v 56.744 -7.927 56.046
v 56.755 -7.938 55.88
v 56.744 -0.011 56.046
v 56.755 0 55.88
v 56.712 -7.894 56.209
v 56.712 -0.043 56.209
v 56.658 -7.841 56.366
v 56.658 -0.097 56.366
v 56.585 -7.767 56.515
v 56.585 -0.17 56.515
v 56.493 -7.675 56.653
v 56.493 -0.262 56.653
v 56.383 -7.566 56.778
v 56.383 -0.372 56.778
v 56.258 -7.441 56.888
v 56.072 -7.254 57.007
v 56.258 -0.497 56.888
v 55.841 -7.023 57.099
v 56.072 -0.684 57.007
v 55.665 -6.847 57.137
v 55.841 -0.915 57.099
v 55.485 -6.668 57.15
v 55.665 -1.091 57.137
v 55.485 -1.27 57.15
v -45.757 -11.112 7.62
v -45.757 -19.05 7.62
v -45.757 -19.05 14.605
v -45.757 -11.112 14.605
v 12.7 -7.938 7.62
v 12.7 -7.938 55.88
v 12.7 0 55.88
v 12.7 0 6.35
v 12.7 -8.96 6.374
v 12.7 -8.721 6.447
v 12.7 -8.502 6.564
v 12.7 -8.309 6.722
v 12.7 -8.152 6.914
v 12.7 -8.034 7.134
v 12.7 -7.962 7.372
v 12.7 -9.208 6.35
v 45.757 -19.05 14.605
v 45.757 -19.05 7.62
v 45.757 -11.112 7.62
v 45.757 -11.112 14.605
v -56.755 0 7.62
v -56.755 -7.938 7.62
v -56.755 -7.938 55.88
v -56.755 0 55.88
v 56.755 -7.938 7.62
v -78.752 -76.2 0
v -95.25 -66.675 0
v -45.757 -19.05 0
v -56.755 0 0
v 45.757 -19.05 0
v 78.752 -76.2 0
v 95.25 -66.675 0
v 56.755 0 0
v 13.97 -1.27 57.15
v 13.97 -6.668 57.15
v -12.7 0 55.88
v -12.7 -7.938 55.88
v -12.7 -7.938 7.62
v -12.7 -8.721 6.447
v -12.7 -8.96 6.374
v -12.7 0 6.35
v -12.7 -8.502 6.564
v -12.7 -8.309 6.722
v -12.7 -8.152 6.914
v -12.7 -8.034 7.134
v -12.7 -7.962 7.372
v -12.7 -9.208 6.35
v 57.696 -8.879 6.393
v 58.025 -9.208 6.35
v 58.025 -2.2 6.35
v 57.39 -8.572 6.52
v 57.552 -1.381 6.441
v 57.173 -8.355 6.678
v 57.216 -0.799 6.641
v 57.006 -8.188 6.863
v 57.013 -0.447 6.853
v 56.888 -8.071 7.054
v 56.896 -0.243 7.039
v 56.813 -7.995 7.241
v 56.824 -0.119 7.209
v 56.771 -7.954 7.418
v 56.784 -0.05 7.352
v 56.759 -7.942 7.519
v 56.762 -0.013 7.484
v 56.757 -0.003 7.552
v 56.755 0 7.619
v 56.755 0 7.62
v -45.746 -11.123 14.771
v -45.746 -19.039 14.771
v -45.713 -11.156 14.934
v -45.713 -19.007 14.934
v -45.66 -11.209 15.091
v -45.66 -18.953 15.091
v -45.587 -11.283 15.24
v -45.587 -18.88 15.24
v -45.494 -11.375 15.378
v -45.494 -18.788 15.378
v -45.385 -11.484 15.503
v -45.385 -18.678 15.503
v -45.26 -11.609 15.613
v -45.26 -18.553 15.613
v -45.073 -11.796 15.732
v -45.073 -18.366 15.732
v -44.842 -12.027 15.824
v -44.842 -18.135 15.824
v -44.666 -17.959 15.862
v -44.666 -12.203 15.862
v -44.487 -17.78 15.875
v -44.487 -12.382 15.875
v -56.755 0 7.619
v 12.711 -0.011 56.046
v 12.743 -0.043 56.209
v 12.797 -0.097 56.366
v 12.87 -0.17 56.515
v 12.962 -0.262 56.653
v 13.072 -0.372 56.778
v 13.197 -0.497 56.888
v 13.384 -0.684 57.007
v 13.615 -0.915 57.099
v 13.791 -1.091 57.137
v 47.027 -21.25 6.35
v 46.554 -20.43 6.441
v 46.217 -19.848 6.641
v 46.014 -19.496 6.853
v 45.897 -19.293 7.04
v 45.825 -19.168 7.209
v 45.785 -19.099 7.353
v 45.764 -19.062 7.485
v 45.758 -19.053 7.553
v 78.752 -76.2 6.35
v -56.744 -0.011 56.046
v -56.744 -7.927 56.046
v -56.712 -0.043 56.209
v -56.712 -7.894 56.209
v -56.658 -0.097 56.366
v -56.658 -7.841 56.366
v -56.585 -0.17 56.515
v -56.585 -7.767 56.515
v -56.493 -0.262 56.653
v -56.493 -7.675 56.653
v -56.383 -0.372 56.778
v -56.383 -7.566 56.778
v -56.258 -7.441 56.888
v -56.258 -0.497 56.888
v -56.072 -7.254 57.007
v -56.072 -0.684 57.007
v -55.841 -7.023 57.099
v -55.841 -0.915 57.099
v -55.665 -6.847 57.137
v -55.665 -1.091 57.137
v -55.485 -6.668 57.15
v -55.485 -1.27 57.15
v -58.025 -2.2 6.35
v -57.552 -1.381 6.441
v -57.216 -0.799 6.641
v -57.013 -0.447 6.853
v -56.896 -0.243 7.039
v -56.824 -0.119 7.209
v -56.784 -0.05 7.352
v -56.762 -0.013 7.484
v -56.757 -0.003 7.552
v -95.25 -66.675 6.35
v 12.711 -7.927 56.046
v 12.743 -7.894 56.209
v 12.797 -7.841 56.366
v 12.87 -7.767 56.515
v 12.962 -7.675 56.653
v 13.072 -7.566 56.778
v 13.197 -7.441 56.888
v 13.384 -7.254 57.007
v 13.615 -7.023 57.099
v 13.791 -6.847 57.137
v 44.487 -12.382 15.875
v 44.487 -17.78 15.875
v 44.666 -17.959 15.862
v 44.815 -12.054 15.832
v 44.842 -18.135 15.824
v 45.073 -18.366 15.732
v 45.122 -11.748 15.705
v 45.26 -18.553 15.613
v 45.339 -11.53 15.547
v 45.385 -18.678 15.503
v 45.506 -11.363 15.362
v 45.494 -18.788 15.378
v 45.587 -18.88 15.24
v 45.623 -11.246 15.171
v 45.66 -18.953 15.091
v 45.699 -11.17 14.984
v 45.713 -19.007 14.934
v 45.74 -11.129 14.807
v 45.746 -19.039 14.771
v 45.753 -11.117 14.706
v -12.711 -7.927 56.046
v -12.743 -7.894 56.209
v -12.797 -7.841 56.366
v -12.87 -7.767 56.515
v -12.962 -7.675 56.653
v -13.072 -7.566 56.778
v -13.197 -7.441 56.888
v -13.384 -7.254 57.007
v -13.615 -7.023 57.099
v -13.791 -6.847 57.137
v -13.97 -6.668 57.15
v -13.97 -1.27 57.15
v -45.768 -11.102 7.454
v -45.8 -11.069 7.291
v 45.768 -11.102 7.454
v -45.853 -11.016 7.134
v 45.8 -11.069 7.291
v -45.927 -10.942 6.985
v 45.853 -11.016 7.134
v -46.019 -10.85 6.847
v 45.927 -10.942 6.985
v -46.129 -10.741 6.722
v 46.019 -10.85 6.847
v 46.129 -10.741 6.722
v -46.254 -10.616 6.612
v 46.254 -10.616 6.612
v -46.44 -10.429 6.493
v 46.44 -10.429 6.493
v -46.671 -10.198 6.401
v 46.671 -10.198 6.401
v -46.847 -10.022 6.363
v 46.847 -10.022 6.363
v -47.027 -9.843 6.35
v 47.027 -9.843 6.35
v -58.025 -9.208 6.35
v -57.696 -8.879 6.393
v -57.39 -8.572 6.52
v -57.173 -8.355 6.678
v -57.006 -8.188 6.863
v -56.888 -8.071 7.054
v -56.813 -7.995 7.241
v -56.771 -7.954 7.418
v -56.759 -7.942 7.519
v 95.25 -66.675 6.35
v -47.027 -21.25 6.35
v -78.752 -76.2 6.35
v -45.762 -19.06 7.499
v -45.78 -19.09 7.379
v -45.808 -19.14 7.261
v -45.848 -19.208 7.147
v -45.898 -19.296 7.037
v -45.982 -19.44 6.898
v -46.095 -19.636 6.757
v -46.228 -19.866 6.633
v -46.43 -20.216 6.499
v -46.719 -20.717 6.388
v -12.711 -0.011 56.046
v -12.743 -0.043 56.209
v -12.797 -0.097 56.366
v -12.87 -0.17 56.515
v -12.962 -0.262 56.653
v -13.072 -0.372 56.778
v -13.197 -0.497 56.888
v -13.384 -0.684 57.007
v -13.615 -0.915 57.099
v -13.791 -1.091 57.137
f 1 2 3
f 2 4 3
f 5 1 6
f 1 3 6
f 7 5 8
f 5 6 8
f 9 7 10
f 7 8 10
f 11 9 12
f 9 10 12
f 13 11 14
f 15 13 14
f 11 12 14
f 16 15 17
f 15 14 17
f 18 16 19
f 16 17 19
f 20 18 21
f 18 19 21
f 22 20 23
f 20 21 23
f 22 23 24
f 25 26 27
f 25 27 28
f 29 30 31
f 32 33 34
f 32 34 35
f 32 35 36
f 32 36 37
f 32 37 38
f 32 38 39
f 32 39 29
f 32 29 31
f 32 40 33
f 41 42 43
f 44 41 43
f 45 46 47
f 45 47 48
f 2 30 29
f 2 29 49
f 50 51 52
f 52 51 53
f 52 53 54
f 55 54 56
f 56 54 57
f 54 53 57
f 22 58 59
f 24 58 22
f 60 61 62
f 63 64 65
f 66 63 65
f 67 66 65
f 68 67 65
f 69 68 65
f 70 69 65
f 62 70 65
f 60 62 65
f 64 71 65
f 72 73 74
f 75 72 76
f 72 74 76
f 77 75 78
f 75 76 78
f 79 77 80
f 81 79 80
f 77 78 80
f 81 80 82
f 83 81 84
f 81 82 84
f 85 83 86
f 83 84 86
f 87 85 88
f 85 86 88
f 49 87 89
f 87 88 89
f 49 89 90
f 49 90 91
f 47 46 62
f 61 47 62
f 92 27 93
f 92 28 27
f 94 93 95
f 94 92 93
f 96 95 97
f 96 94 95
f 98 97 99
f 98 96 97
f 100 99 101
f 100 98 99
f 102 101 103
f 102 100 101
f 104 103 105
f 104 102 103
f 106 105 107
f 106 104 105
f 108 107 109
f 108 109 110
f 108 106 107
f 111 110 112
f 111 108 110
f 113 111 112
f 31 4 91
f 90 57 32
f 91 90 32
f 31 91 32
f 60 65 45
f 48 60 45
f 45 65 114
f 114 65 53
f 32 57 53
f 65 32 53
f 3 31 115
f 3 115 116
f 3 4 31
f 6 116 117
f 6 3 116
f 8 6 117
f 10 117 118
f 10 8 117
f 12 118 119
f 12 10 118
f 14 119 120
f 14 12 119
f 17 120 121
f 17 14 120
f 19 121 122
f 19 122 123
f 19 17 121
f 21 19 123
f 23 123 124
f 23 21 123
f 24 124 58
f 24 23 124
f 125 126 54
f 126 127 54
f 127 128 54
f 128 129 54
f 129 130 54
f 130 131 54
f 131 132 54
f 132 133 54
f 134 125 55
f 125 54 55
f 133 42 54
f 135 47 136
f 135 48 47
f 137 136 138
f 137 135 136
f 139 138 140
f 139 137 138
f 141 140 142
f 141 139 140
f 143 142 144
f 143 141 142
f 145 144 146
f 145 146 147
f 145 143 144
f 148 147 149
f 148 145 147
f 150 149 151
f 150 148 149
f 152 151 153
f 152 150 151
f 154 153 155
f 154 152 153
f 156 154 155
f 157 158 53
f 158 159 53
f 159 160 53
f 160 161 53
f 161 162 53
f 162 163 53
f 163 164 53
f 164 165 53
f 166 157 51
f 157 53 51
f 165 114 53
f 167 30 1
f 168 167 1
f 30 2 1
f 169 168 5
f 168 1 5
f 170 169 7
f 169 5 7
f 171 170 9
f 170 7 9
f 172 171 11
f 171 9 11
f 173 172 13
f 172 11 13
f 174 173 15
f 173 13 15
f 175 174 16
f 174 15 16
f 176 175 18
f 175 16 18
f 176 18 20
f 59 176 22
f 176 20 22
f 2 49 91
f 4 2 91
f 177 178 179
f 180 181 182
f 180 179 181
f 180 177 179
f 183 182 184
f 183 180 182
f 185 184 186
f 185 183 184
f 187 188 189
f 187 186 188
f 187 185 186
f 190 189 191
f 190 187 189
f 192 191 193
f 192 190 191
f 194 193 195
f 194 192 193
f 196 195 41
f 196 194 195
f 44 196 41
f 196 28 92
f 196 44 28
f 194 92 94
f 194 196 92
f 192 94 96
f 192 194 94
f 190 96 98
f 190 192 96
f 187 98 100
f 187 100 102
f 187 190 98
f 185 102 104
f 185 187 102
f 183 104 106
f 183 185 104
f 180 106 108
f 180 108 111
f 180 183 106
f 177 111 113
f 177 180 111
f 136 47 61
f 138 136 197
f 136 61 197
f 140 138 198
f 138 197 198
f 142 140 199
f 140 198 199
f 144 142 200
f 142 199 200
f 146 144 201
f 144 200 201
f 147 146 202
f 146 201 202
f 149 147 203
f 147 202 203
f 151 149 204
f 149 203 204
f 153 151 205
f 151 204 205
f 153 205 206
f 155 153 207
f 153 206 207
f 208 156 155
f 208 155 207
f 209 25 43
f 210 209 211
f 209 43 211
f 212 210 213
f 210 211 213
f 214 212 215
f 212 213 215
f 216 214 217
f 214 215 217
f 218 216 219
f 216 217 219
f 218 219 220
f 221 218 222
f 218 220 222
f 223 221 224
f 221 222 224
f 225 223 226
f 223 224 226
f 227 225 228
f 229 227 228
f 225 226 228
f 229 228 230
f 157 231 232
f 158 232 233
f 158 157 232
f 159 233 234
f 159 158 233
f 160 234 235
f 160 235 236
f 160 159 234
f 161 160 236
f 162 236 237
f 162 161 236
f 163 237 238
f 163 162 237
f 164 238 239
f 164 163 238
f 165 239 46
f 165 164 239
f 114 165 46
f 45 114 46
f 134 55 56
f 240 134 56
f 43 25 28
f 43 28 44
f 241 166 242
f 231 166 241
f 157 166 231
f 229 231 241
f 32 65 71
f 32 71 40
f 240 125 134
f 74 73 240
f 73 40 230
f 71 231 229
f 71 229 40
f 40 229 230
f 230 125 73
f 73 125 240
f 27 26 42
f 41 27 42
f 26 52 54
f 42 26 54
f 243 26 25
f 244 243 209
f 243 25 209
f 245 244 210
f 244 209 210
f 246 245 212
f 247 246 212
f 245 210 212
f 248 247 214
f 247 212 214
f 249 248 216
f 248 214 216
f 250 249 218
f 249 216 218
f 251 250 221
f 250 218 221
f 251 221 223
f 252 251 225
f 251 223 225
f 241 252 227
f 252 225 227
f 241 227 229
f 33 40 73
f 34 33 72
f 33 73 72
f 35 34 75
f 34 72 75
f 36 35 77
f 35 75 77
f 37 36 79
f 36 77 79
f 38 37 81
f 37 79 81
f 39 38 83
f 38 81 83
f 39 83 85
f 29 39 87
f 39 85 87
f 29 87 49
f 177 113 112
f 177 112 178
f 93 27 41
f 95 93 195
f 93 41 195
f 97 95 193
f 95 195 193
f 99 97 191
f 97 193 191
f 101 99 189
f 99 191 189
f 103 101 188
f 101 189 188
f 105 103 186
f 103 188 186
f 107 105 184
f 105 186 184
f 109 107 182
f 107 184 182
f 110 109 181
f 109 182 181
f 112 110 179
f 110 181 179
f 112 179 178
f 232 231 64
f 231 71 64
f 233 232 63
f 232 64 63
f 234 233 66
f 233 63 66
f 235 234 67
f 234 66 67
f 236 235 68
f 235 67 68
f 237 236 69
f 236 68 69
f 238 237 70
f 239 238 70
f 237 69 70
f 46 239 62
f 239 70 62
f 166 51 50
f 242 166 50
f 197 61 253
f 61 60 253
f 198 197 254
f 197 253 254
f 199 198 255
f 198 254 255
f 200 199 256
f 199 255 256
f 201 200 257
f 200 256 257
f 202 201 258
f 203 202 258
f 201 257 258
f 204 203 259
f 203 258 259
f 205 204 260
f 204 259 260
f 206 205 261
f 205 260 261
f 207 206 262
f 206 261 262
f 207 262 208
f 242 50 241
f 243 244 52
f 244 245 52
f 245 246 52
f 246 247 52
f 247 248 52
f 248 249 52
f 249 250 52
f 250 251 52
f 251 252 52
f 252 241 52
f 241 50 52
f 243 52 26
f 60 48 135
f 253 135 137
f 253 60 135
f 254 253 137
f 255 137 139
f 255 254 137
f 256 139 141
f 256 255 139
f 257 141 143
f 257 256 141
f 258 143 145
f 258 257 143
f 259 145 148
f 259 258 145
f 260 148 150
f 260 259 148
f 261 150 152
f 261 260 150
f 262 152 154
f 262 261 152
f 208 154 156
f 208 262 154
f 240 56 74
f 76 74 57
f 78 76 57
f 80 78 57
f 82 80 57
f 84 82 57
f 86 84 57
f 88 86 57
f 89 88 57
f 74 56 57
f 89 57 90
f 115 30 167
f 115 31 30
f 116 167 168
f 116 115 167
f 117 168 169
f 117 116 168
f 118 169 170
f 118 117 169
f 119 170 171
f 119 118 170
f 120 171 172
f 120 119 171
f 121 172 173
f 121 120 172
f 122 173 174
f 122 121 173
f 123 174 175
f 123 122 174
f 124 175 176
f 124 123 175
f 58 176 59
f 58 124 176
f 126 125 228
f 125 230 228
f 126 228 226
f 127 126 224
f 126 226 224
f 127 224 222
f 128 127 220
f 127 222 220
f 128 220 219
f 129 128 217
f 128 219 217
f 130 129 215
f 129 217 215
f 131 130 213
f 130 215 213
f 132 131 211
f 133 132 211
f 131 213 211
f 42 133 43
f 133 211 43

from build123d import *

# Parameters (mm, degrees)
F1_DEPTH = 6.35
F2_W     = 44.055171
F2_H     = 7.9375
F3_DEPTH = 50.8
F4_W     = 91.513296
F4_H     = 7.9375
F5_DEPTH = 9.525
F6_R     = 1.27


with BuildPart() as f1:
    # F0 (on Top) → F1 (new body)
    with BuildSketch(Plane.XY):
        Polygon((56.755171, 0), (-56.755171, 0), (-95.25, -66.675), (-78.752216, -76.2), (-45.756648, -19.05), (0, -19.05), (45.756648, -19.05), (78.752216, -76.2), (95.25, -66.675), align=None)
    extrude(amount=F1_DEPTH)

    # F2 (on face) → F3 (join)
    with BuildSketch(Plane.XY.offset(6.35)):
        with Locations((-34.727585, -3.96875)):
            Rectangle(F2_W, F2_H)
        with Locations((34.727585, -3.96875)):
            Rectangle(F2_W, F2_H)
    extrude(amount=F3_DEPTH)

    # F4 (on face) → F5 (join)
    with BuildSketch(Plane.XY.offset(6.35)):
        with Locations((0, -15.08125)):
            Rectangle(F4_W, F4_H)
    extrude(amount=F5_DEPTH)

    # F6
    f6_edges = [f1.edges().sort_by_distance(p)[0] for p in [
        (-45.756648, -15.08125, 15.875),
        (0, -19.05, 15.875),
        (45.756648, -15.08125, 15.875),
        (0, -11.1125, 15.875),
        (-34.727585, 0, 57.15),
        (-56.755171, -3.96875, 57.15),
        (-34.727585, -7.9375, 57.15),
        (-12.7, -3.96875, 57.15),
        (34.727585, -7.9375, 57.15),
        (56.755171, -3.96875, 57.15),
        (34.727585, 0, 57.15),
        (12.7, -3.96875, 57.15),
        (-56.755171, -3.96875, 6.35),
        (-34.727585, -7.9375, 6.35),
        (-45.756648, -15.08125, 6.35),
        (0, -11.1125, 6.35),
        (34.727585, -7.9375, 6.35),
        (45.756648, -15.08125, 6.35),
        (56.755171, -3.96875, 6.35),
    ]]
    fillet(f6_edges, radius=F6_R)


solid = f1.part
